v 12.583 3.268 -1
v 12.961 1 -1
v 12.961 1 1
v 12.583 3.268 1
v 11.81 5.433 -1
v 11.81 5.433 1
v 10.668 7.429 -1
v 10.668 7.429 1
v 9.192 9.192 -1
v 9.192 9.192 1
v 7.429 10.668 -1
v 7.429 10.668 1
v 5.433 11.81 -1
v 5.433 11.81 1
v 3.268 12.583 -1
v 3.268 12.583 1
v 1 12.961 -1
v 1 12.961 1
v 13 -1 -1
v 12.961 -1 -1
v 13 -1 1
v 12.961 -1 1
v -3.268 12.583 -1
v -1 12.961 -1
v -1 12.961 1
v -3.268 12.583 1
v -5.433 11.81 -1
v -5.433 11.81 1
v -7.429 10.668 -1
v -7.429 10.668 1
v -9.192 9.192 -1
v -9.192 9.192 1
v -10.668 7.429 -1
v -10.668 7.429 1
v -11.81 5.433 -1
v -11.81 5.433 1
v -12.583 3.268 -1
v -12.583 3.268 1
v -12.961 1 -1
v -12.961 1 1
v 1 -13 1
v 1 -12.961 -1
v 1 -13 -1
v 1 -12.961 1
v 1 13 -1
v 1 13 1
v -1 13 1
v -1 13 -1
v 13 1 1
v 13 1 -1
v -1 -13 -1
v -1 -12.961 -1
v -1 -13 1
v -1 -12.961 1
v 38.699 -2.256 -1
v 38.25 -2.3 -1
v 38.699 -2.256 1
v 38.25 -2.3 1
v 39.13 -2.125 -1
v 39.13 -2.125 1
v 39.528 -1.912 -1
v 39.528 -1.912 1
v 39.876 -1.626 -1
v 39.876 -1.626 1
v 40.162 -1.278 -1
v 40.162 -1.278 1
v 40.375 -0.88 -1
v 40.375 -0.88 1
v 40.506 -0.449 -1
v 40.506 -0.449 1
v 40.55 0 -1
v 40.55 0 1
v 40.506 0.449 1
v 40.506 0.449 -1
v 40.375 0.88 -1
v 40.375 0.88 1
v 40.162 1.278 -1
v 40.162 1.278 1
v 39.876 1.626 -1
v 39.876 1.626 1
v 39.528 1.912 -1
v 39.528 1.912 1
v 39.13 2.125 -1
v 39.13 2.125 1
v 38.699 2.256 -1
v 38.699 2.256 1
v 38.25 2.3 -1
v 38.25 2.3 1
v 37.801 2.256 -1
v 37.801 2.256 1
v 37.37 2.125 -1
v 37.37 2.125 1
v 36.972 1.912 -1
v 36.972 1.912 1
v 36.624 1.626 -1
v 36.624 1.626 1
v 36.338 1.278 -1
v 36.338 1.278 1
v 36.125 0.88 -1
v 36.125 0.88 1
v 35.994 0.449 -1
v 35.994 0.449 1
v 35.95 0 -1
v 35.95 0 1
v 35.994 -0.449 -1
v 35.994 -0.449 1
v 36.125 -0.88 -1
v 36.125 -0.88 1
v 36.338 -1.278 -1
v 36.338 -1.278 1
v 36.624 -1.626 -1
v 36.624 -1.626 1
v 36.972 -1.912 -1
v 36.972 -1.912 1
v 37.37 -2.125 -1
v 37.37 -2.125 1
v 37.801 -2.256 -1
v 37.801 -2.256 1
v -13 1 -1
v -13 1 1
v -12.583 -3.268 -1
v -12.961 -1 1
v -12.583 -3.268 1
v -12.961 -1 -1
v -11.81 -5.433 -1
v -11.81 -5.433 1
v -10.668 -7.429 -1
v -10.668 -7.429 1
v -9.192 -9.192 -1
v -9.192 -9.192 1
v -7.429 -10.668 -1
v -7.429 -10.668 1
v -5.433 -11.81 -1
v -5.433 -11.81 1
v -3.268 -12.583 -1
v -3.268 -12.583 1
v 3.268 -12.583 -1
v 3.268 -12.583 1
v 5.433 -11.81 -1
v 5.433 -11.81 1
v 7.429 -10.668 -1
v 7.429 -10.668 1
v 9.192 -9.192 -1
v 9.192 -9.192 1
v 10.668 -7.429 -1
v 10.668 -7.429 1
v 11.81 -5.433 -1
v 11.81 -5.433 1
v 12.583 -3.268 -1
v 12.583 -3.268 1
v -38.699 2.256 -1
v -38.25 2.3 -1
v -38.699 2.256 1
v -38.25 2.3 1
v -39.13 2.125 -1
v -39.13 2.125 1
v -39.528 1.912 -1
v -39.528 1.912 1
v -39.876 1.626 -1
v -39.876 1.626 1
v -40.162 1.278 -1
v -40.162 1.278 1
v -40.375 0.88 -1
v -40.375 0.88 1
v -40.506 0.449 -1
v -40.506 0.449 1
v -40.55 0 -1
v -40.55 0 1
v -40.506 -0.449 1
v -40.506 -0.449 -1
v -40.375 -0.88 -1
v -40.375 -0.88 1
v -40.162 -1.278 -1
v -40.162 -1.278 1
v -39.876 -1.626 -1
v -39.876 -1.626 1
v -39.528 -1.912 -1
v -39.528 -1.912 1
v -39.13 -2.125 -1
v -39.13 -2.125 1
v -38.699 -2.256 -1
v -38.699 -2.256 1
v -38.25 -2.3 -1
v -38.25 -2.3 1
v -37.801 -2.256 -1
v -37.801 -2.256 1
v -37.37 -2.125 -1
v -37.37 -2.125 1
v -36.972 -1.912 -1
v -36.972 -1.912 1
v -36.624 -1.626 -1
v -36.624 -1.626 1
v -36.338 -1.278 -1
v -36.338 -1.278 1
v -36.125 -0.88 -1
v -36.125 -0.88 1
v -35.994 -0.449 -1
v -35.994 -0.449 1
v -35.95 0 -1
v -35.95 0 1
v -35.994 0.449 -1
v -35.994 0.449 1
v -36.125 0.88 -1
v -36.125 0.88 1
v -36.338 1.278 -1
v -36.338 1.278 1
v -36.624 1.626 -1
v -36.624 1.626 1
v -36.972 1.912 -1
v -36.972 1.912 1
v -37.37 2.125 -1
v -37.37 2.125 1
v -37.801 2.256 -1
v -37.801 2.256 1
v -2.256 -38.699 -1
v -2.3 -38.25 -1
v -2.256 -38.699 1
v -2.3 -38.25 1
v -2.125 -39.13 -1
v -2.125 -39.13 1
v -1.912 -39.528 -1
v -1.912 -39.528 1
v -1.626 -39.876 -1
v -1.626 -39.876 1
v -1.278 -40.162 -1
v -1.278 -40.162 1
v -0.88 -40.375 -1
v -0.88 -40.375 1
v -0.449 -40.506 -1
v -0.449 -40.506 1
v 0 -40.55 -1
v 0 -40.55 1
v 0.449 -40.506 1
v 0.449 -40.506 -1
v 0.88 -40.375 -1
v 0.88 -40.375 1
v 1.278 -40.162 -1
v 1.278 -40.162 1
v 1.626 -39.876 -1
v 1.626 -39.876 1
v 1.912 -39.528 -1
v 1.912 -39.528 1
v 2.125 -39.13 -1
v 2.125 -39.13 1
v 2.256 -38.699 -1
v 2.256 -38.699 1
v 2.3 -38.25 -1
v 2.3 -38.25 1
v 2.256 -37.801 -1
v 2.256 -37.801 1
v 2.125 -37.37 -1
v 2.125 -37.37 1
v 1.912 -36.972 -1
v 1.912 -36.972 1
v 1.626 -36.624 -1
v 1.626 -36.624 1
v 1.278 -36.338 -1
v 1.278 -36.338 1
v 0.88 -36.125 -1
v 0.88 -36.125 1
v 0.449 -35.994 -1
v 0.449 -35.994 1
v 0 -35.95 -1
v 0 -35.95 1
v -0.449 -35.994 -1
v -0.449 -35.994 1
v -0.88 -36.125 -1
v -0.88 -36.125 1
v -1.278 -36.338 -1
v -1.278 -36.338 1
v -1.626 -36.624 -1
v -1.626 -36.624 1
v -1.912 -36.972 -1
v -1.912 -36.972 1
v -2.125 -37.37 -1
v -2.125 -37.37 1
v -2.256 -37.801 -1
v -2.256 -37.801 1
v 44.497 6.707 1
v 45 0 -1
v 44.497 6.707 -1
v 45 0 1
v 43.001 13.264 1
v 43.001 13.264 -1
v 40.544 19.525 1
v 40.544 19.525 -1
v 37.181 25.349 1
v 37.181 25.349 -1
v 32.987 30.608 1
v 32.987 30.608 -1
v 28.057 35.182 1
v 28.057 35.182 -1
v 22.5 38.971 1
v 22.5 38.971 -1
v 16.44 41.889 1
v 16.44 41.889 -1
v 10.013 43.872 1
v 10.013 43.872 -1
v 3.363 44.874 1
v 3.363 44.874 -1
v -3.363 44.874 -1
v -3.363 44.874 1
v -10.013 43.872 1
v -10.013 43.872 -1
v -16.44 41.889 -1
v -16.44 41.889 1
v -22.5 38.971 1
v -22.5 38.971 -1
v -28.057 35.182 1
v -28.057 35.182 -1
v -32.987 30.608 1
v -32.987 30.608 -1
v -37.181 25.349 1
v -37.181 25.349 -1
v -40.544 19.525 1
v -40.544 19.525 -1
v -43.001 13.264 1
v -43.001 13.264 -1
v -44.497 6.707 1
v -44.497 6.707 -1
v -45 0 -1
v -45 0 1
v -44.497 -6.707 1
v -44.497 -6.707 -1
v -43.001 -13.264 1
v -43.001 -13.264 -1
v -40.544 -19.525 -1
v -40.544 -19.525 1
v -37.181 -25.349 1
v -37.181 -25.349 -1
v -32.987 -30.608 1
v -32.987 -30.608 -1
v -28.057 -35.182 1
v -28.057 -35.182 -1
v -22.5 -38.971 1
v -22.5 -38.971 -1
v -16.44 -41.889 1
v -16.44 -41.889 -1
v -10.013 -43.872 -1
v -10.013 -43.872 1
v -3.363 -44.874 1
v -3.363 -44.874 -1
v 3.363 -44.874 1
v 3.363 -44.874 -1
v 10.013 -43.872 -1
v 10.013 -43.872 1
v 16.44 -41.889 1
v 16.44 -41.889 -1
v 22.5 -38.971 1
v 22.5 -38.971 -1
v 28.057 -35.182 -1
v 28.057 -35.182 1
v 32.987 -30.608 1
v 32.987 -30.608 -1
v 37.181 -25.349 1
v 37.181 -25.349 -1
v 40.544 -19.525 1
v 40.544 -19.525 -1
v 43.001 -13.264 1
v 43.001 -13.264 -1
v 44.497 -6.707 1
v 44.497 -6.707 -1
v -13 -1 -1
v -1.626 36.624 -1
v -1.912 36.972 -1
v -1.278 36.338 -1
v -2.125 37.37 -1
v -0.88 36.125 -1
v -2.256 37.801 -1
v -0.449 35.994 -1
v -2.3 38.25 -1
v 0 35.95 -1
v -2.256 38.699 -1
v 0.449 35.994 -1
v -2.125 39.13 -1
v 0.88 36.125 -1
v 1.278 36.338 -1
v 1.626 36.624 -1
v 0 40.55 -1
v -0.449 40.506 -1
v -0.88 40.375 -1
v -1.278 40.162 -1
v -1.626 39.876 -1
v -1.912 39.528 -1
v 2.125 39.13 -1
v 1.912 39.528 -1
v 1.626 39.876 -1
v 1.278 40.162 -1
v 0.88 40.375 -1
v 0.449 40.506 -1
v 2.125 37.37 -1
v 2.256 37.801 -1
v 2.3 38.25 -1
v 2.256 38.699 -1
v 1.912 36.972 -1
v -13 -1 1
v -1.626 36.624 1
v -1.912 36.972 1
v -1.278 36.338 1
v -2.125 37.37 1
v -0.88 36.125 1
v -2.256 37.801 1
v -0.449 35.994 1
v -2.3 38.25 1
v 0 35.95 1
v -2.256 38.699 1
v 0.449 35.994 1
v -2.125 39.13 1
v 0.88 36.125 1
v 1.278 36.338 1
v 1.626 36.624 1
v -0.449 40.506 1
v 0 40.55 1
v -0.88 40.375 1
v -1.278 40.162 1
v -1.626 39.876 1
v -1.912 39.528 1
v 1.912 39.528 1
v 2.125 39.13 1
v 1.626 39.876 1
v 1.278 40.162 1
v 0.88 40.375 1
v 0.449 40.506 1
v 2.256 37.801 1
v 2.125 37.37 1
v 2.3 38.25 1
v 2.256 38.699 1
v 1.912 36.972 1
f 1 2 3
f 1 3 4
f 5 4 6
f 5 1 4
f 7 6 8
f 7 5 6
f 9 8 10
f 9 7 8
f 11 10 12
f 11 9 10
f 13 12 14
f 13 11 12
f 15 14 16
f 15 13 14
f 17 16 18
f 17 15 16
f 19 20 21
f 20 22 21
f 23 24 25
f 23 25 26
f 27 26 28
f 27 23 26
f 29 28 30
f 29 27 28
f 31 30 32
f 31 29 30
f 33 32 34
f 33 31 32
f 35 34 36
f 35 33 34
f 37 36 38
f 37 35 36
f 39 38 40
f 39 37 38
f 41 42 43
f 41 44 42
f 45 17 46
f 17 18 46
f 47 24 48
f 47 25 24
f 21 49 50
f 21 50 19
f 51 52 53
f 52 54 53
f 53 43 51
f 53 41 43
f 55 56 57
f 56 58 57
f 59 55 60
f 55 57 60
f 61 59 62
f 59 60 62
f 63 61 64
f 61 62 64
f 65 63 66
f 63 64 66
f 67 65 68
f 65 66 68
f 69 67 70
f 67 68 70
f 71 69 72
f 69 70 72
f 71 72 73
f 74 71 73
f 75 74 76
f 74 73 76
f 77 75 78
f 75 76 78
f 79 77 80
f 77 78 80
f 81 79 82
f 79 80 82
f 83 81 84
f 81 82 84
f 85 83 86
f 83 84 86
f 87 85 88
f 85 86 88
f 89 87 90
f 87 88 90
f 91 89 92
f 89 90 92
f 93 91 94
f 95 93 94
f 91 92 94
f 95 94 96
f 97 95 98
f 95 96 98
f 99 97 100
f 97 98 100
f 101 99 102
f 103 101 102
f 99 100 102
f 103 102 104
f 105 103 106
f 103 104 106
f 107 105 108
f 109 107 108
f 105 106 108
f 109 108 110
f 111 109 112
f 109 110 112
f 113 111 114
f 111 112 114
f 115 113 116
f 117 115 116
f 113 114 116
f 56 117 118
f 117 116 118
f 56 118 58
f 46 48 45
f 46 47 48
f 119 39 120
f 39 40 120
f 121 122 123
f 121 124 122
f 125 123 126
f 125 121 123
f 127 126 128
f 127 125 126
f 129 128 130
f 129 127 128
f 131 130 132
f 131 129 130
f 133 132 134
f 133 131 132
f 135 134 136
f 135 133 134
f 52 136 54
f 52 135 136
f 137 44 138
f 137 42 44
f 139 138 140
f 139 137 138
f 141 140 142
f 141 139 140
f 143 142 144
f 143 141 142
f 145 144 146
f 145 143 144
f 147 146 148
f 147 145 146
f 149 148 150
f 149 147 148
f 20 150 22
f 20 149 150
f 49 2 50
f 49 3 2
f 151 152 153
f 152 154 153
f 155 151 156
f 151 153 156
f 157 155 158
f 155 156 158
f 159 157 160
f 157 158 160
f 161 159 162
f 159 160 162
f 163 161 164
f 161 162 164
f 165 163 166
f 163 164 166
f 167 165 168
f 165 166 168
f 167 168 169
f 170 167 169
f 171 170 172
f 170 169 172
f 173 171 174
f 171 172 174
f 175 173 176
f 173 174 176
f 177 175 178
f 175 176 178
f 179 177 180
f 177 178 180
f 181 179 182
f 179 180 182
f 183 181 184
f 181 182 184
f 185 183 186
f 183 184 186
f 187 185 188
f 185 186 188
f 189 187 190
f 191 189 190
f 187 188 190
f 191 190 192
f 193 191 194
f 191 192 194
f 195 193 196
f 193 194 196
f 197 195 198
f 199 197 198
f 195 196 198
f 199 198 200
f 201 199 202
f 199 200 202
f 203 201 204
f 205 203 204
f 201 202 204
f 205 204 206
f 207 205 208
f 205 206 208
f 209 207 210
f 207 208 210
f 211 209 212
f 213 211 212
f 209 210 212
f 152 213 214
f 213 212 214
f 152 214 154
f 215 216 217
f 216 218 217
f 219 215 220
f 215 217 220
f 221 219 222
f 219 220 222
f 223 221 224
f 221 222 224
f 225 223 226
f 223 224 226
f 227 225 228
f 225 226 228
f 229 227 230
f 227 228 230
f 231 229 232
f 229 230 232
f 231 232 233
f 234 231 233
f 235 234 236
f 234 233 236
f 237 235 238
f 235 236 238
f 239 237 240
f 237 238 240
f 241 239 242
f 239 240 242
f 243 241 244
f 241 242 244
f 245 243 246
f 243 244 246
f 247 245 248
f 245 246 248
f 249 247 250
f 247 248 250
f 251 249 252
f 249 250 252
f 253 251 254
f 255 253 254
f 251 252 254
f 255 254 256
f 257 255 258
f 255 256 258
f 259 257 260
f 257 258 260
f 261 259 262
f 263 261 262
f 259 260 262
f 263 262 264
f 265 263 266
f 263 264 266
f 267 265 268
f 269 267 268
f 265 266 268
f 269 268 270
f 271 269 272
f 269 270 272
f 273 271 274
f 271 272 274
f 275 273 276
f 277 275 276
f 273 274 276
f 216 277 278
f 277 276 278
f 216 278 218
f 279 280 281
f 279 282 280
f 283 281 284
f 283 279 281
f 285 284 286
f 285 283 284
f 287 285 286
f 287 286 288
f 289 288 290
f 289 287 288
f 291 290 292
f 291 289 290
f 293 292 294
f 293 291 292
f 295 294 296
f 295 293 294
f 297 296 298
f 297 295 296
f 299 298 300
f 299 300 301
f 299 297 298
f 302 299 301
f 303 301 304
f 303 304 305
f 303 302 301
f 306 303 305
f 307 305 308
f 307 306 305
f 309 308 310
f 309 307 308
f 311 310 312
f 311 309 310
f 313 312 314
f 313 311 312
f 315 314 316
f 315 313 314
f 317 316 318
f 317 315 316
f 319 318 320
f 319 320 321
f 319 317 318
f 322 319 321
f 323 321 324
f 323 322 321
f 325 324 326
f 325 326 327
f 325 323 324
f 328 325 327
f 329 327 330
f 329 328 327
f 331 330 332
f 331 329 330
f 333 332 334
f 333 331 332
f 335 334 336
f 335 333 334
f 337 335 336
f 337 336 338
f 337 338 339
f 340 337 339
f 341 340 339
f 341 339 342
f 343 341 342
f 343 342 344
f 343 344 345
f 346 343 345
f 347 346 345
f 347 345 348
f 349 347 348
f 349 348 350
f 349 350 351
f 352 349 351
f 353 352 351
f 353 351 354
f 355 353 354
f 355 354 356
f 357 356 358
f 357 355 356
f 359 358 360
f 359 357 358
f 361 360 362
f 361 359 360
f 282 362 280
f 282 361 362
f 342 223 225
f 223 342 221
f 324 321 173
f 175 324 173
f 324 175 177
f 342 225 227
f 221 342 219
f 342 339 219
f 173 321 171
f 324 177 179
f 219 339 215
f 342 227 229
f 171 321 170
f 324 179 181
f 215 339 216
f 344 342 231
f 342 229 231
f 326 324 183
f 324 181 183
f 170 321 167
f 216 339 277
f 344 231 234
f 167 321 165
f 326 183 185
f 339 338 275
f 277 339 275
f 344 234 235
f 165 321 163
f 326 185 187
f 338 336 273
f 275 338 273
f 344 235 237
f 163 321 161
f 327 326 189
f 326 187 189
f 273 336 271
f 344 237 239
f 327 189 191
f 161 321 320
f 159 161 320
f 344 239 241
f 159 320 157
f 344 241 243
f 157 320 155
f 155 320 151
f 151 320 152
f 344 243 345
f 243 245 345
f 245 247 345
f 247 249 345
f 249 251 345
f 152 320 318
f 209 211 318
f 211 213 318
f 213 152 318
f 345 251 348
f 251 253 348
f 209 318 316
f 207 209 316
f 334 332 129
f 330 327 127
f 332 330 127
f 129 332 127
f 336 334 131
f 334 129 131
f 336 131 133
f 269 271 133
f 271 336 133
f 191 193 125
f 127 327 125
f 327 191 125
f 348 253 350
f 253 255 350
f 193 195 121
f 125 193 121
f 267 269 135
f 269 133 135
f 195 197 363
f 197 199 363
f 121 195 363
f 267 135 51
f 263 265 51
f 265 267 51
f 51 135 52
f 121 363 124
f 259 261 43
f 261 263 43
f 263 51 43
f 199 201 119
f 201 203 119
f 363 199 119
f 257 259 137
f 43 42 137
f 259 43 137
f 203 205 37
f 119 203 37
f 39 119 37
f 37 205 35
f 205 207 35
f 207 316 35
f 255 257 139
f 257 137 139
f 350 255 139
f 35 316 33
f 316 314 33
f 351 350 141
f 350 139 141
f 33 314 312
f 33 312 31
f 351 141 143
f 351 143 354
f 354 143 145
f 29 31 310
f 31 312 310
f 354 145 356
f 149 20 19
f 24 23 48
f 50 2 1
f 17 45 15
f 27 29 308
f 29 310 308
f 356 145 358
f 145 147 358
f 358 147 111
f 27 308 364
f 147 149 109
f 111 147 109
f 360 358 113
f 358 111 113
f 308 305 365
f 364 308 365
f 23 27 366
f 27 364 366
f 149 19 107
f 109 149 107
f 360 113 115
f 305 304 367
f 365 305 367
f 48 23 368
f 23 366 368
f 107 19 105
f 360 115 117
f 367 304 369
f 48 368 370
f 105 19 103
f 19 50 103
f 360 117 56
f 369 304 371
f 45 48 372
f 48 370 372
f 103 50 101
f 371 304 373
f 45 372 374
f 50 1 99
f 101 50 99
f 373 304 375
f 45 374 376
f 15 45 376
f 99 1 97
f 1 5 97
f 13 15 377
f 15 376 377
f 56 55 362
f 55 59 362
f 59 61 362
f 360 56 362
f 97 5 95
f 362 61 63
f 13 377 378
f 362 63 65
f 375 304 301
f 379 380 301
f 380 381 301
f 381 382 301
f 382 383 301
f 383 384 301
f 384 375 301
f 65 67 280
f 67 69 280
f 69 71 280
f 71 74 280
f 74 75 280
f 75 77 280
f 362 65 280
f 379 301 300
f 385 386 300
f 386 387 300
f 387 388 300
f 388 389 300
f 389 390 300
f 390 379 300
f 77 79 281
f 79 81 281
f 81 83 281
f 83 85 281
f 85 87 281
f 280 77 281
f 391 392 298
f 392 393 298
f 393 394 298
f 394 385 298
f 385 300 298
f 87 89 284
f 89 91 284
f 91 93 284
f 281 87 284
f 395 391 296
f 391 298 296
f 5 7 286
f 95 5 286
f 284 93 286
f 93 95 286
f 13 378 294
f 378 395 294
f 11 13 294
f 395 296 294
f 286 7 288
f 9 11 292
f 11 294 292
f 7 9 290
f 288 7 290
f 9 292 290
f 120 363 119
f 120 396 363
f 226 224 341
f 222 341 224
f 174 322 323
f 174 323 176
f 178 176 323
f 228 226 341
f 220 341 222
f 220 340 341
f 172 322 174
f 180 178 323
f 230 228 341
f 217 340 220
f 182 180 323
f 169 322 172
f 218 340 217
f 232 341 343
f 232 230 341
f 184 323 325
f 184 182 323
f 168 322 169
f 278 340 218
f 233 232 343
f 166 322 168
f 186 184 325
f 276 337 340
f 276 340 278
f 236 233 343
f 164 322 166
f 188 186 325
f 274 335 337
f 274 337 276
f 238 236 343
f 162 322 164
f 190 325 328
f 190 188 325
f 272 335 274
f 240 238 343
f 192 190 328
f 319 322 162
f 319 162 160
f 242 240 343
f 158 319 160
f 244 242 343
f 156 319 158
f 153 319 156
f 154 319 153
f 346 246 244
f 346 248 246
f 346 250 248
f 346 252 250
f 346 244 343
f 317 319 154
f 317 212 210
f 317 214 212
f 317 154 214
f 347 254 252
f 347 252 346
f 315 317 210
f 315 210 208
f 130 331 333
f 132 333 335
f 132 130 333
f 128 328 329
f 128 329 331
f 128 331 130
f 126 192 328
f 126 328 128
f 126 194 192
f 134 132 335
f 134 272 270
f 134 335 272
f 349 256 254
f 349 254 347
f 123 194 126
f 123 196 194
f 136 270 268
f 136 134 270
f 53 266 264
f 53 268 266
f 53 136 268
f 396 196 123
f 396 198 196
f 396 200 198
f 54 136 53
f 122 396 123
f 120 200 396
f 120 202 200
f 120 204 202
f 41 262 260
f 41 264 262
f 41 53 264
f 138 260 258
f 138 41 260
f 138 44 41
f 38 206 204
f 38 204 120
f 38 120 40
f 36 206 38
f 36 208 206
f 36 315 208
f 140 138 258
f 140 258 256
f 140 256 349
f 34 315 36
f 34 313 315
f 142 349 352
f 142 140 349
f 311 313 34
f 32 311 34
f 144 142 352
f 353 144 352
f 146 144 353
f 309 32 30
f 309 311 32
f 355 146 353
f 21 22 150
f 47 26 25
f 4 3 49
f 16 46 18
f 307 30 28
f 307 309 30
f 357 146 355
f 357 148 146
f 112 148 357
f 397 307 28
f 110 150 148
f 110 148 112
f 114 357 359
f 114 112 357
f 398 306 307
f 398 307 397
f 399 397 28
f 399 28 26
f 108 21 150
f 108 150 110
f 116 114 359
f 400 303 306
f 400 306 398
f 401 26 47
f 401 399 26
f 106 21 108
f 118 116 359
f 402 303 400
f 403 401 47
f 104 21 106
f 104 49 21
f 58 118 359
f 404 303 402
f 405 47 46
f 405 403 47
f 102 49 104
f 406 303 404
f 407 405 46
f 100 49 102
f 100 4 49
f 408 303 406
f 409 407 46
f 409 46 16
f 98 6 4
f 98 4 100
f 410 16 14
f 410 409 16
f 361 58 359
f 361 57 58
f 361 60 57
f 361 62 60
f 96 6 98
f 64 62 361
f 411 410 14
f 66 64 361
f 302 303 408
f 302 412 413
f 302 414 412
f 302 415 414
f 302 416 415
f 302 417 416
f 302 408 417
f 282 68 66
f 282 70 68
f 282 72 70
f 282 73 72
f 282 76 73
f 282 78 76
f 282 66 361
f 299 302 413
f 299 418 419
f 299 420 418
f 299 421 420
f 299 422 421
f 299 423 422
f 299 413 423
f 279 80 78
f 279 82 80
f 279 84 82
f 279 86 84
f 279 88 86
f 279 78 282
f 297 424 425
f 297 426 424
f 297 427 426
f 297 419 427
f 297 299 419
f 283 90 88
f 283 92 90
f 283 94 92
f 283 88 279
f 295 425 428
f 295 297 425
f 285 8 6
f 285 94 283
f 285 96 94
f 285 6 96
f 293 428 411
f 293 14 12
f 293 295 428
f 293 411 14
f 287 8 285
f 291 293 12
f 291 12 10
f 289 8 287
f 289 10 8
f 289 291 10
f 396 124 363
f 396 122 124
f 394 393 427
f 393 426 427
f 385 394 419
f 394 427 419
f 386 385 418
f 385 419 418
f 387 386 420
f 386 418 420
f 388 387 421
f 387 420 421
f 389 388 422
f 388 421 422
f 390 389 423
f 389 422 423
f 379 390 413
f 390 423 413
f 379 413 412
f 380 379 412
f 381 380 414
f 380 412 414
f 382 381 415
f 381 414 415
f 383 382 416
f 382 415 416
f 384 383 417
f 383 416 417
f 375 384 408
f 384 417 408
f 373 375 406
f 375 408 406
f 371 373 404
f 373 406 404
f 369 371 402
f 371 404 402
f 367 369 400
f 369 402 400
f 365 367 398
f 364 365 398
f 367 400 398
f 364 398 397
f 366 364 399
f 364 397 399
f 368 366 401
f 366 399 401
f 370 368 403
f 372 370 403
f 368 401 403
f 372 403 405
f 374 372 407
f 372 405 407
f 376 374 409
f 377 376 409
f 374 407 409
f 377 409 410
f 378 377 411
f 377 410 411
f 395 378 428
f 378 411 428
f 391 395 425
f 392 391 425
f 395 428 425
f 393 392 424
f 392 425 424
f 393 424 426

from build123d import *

# Parameters (mm, degrees)
SKETCH003_R           = 2.3
SKETCH003_W           = 2
SKETCH003_H           = 5
EXTRUDE003_DEPTH      = 5
EXTRUDE003_DEPTH_BACK = 3
ARRAY001_COUNT        = 4
SKETCH002_R           = 45
SKETCH002_R_2         = 13
EXTRUDE002_DEPTH      = 1


with BuildPart() as array001:
    # Sketch003 → Extrude003 (new body, two sides)
    with BuildSketch(Plane.XY) as extrude003_sk:
        with Locations((0, 38.25)):
            Circle(SKETCH003_R)
        with Locations((0, 10.5)):
            Rectangle(SKETCH003_W, SKETCH003_H)
    extrude(amount=EXTRUDE003_DEPTH)
    extrude(extrude003_sk.sketch, amount=-EXTRUDE003_DEPTH_BACK)

    # Array001: Array001 ×4 about axis
    array001_axis = Axis((0, 0, 0), (0, 0, 1))


with BuildPart() as array001_1:
    add(array001.part)
    for i in range(1, ARRAY001_COUNT):
        add(array001.part.rotate(array001_axis, i * 360 / ARRAY001_COUNT))


with BuildPart() as cut:
    # Sketch002 → Extrude002 (new body, symmetric)
    with BuildSketch(Plane.XY):
        Circle(SKETCH002_R)
        Circle(SKETCH002_R_2, mode=Mode.SUBTRACT)
    extrude(amount=EXTRUDE002_DEPTH, both=True)

    # Cut: cut Array001
    add(array001_1.part, mode=Mode.SUBTRACT)


solid = cut.part
